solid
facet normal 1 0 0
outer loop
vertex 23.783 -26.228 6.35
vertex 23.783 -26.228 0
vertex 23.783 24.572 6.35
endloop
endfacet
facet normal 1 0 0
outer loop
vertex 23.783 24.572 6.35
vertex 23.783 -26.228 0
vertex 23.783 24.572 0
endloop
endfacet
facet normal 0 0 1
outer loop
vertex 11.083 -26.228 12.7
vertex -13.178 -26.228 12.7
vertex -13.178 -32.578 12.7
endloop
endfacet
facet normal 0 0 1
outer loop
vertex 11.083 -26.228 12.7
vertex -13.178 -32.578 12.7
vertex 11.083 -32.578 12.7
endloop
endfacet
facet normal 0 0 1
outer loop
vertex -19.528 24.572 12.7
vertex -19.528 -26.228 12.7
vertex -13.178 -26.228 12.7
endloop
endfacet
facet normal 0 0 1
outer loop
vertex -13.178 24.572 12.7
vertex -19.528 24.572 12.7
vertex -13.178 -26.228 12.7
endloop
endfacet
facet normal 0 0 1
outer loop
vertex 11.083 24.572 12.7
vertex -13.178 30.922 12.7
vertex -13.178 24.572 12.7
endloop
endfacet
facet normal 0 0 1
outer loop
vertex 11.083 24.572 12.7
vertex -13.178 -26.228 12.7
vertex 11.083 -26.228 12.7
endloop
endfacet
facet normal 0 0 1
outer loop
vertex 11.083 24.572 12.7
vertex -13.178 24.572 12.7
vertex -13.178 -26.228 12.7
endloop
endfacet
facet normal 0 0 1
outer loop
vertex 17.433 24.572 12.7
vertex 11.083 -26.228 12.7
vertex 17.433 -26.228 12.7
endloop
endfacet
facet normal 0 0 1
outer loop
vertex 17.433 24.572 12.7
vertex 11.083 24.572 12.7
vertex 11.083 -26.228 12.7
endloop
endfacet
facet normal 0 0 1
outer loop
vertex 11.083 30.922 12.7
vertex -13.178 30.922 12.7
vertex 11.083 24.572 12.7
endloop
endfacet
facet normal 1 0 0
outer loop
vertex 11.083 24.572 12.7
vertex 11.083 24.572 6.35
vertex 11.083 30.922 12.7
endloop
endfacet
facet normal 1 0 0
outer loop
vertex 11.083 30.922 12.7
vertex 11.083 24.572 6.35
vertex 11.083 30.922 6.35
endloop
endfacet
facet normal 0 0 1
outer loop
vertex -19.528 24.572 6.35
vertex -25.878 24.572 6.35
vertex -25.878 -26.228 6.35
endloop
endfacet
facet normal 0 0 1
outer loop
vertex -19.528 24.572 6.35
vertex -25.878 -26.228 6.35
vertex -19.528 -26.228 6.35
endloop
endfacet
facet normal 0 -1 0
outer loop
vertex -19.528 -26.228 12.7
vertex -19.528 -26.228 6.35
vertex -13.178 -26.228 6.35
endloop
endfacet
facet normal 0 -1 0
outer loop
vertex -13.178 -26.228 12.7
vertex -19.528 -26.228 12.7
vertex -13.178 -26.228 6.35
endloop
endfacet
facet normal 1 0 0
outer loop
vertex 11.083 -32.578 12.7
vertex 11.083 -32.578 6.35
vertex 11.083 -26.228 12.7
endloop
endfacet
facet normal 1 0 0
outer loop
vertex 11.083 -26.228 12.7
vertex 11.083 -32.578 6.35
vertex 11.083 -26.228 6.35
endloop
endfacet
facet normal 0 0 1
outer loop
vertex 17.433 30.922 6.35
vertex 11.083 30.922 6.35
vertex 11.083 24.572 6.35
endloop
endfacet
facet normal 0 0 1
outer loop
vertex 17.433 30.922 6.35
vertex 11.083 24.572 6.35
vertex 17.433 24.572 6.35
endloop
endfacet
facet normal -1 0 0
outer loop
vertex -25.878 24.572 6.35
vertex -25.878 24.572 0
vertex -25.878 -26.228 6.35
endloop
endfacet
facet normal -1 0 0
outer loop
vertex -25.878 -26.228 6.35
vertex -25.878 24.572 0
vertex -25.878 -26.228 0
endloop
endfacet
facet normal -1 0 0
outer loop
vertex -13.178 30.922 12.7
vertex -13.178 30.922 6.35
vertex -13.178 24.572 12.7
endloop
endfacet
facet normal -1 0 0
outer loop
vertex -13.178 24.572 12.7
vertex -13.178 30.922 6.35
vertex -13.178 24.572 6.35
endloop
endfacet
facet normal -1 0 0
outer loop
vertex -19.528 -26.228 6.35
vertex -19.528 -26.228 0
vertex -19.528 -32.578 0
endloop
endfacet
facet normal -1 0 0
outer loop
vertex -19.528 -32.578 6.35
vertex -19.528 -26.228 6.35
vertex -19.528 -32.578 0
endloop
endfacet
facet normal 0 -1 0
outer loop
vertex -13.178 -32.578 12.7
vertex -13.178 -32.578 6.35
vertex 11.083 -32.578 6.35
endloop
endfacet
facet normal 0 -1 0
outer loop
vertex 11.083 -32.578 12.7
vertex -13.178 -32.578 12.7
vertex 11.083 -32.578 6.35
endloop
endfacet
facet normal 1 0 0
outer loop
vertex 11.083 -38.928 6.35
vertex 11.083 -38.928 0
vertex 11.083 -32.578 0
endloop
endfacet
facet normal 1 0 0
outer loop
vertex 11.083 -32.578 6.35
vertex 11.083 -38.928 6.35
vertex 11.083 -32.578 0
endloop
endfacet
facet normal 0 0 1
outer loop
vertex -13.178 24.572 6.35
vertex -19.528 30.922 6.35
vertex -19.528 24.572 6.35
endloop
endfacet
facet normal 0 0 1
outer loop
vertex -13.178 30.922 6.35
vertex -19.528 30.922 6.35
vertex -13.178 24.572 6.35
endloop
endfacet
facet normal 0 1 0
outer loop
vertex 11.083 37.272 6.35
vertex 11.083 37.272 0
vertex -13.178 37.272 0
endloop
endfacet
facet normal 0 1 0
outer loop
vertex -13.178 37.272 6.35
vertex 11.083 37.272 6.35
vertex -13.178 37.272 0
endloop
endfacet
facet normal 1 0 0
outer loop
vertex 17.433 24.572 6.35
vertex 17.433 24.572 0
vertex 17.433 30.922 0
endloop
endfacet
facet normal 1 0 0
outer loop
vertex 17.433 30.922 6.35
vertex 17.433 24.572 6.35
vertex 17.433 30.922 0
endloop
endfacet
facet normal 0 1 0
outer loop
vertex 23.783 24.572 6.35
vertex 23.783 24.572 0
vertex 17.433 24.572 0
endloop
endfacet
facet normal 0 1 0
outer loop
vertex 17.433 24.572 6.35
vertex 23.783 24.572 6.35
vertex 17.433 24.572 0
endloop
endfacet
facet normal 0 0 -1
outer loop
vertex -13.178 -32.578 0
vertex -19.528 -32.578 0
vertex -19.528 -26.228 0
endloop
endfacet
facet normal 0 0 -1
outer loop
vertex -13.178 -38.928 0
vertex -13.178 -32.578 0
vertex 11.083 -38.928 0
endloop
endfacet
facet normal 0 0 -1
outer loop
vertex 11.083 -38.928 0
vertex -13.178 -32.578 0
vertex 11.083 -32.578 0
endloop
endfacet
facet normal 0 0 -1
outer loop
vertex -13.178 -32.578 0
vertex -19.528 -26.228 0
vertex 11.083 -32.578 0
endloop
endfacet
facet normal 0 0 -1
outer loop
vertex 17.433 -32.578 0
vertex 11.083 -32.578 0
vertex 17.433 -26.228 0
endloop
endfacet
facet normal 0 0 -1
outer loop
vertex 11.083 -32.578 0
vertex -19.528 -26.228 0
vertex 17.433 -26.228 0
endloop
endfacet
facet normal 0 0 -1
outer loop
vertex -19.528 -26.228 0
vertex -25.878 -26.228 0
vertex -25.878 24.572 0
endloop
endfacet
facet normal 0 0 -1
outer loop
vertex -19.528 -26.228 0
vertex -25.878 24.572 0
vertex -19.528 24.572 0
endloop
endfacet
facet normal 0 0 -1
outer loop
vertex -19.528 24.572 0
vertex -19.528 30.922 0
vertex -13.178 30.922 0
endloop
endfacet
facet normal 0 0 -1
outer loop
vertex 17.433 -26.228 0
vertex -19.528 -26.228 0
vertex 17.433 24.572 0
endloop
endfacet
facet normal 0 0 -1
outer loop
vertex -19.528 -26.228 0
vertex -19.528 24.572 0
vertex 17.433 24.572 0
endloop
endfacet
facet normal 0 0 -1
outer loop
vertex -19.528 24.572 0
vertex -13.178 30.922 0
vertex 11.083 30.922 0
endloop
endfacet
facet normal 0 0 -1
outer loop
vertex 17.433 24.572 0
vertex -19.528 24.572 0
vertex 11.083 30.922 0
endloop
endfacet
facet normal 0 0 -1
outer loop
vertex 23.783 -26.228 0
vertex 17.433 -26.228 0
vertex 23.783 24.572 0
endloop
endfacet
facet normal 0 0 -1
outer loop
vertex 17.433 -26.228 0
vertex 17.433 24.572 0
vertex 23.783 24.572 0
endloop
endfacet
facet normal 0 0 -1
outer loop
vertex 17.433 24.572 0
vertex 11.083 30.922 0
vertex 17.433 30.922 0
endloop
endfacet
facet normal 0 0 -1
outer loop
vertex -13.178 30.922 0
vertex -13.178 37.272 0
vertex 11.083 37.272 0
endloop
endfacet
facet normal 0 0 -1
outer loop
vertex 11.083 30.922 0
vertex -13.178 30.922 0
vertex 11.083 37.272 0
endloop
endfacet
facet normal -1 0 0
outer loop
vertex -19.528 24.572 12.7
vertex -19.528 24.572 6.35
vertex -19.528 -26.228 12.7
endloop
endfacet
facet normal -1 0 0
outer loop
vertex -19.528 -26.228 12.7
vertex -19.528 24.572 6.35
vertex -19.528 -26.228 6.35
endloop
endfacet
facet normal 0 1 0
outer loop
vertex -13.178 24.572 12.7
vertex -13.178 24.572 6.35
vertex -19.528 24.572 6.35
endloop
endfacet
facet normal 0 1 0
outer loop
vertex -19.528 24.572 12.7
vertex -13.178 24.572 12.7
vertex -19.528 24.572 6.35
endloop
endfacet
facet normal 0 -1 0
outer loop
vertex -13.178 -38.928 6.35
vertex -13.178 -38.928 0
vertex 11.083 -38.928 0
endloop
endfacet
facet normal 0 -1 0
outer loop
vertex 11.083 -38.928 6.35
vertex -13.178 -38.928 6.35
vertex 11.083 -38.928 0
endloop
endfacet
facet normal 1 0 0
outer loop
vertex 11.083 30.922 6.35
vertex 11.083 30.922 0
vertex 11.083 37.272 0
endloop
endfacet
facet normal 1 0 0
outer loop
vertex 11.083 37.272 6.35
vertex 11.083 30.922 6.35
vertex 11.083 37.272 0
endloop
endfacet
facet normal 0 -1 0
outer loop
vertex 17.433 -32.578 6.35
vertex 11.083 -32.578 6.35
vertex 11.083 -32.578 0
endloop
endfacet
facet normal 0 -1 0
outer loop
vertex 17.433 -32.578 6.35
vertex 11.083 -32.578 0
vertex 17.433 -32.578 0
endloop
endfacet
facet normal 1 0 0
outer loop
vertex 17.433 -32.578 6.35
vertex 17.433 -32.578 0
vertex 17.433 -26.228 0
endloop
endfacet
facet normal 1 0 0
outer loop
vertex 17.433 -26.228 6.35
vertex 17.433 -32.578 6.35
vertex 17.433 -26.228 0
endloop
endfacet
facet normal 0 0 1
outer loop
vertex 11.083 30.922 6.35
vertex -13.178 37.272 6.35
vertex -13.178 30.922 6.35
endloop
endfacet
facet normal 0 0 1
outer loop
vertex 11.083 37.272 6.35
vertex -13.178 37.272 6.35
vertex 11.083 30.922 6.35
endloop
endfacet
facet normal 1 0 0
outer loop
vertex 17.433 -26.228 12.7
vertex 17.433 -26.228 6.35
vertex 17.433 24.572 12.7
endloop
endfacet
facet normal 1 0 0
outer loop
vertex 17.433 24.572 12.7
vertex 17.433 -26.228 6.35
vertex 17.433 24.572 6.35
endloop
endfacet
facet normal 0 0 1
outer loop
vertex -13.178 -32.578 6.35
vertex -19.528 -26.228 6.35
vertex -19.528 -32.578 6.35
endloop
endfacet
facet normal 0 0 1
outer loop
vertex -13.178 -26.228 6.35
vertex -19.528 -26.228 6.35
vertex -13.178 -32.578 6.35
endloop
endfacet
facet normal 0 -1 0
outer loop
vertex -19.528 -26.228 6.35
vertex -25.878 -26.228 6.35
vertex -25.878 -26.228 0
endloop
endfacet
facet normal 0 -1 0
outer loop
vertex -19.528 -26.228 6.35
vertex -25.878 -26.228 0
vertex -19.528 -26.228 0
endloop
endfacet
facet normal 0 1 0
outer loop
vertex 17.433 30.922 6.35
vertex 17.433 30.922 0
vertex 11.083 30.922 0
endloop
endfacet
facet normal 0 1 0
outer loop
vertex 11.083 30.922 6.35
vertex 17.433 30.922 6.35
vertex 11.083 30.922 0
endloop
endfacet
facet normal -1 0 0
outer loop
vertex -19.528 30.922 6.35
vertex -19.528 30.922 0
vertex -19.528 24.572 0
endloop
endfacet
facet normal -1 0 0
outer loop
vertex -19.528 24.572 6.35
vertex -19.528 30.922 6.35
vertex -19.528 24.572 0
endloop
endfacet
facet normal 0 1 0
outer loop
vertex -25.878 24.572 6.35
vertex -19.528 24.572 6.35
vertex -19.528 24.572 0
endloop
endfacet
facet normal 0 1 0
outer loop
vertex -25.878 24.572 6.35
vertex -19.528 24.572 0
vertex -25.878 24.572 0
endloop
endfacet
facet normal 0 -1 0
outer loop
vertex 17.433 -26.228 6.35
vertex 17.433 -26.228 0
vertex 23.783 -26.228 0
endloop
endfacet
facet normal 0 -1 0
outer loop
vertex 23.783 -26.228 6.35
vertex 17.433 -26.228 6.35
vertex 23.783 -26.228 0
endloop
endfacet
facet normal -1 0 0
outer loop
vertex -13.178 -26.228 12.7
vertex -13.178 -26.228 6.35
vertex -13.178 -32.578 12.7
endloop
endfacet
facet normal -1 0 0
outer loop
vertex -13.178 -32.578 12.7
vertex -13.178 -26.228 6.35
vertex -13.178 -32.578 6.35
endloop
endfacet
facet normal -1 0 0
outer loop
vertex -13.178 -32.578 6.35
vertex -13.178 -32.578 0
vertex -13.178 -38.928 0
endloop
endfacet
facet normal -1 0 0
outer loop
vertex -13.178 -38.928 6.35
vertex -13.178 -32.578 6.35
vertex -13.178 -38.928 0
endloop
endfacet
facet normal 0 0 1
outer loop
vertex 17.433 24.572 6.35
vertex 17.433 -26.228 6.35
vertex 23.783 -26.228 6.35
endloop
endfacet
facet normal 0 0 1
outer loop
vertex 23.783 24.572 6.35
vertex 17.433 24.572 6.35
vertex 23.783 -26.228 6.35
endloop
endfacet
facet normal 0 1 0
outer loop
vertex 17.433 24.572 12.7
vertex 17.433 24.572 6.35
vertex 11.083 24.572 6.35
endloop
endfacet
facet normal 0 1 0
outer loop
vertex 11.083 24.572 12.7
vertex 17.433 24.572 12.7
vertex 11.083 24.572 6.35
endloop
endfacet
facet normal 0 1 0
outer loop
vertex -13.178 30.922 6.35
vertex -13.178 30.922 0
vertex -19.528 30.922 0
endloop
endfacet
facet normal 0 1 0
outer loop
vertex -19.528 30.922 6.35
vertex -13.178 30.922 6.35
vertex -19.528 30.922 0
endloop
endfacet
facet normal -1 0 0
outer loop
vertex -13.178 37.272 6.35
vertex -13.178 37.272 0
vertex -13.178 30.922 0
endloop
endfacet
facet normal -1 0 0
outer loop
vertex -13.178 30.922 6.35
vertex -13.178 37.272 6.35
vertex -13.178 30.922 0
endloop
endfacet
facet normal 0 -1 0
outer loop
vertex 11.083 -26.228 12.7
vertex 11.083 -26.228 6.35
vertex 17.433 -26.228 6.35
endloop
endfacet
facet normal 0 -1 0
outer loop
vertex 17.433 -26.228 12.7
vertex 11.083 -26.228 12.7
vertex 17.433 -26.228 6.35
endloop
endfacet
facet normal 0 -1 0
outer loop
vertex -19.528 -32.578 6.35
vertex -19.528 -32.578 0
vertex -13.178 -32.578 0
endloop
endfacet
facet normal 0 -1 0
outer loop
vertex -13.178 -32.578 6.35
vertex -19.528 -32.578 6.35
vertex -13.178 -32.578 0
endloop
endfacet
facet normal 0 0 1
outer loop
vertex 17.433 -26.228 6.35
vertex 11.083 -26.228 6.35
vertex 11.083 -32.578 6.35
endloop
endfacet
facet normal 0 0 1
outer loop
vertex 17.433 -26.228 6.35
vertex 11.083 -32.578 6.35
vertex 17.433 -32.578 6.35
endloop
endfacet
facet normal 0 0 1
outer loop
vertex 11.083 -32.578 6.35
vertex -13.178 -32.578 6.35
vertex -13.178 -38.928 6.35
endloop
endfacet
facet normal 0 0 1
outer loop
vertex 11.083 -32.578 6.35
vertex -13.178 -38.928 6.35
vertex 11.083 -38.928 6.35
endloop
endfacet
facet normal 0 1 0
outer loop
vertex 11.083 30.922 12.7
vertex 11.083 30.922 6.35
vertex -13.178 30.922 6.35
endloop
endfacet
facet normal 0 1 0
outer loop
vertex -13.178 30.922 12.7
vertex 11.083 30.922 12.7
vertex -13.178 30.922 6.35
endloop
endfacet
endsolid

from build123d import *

# Parameters (mm, degrees)
F1_DEPTH = 6.35
F3_DEPTH = 6.35


with BuildPart() as f1:
    # F0 (on Top) → F1 (new body)
    with BuildSketch(Plane.XY):
        Polygon((11.083248, 37.27174), (-13.177601, 37.27174), (-13.177601, 30.92174), (-19.527601, 30.92174), (-19.527601, 24.57174), (-25.877601, 24.57174), (-25.877601, -26.22826), (-19.527601, -26.22826), (-19.527601, -32.57826), (-13.177601, -32.57826), (-13.177601, -38.92826), (11.083248, -38.92826), (11.083248, -32.57826), (17.433248, -32.57826), (17.433248, -26.22826), (23.783248, -26.22826), (23.783248, 24.57174), (17.433248, 24.57174), (17.433248, 30.92174), (11.083248, 30.92174), align=None)
    extrude(amount=F1_DEPTH)

    # F2 (on face) → F3 (join)
    with BuildSketch(Plane.XY.offset(6.35)):
        Polygon((11.083248, 30.92174), (-13.177601, 30.92174), (-13.177601, 24.57174), (-19.527601, 24.57174), (-19.527601, -26.22826), (-13.177601, -26.22826), (-13.177601, -32.57826), (11.083248, -32.57826), (11.083248, -26.22826), (17.433248, -26.22826), (17.433248, 24.57174), (11.083248, 24.57174), align=None)
    extrude(amount=F3_DEPTH)


solid = f1.part
